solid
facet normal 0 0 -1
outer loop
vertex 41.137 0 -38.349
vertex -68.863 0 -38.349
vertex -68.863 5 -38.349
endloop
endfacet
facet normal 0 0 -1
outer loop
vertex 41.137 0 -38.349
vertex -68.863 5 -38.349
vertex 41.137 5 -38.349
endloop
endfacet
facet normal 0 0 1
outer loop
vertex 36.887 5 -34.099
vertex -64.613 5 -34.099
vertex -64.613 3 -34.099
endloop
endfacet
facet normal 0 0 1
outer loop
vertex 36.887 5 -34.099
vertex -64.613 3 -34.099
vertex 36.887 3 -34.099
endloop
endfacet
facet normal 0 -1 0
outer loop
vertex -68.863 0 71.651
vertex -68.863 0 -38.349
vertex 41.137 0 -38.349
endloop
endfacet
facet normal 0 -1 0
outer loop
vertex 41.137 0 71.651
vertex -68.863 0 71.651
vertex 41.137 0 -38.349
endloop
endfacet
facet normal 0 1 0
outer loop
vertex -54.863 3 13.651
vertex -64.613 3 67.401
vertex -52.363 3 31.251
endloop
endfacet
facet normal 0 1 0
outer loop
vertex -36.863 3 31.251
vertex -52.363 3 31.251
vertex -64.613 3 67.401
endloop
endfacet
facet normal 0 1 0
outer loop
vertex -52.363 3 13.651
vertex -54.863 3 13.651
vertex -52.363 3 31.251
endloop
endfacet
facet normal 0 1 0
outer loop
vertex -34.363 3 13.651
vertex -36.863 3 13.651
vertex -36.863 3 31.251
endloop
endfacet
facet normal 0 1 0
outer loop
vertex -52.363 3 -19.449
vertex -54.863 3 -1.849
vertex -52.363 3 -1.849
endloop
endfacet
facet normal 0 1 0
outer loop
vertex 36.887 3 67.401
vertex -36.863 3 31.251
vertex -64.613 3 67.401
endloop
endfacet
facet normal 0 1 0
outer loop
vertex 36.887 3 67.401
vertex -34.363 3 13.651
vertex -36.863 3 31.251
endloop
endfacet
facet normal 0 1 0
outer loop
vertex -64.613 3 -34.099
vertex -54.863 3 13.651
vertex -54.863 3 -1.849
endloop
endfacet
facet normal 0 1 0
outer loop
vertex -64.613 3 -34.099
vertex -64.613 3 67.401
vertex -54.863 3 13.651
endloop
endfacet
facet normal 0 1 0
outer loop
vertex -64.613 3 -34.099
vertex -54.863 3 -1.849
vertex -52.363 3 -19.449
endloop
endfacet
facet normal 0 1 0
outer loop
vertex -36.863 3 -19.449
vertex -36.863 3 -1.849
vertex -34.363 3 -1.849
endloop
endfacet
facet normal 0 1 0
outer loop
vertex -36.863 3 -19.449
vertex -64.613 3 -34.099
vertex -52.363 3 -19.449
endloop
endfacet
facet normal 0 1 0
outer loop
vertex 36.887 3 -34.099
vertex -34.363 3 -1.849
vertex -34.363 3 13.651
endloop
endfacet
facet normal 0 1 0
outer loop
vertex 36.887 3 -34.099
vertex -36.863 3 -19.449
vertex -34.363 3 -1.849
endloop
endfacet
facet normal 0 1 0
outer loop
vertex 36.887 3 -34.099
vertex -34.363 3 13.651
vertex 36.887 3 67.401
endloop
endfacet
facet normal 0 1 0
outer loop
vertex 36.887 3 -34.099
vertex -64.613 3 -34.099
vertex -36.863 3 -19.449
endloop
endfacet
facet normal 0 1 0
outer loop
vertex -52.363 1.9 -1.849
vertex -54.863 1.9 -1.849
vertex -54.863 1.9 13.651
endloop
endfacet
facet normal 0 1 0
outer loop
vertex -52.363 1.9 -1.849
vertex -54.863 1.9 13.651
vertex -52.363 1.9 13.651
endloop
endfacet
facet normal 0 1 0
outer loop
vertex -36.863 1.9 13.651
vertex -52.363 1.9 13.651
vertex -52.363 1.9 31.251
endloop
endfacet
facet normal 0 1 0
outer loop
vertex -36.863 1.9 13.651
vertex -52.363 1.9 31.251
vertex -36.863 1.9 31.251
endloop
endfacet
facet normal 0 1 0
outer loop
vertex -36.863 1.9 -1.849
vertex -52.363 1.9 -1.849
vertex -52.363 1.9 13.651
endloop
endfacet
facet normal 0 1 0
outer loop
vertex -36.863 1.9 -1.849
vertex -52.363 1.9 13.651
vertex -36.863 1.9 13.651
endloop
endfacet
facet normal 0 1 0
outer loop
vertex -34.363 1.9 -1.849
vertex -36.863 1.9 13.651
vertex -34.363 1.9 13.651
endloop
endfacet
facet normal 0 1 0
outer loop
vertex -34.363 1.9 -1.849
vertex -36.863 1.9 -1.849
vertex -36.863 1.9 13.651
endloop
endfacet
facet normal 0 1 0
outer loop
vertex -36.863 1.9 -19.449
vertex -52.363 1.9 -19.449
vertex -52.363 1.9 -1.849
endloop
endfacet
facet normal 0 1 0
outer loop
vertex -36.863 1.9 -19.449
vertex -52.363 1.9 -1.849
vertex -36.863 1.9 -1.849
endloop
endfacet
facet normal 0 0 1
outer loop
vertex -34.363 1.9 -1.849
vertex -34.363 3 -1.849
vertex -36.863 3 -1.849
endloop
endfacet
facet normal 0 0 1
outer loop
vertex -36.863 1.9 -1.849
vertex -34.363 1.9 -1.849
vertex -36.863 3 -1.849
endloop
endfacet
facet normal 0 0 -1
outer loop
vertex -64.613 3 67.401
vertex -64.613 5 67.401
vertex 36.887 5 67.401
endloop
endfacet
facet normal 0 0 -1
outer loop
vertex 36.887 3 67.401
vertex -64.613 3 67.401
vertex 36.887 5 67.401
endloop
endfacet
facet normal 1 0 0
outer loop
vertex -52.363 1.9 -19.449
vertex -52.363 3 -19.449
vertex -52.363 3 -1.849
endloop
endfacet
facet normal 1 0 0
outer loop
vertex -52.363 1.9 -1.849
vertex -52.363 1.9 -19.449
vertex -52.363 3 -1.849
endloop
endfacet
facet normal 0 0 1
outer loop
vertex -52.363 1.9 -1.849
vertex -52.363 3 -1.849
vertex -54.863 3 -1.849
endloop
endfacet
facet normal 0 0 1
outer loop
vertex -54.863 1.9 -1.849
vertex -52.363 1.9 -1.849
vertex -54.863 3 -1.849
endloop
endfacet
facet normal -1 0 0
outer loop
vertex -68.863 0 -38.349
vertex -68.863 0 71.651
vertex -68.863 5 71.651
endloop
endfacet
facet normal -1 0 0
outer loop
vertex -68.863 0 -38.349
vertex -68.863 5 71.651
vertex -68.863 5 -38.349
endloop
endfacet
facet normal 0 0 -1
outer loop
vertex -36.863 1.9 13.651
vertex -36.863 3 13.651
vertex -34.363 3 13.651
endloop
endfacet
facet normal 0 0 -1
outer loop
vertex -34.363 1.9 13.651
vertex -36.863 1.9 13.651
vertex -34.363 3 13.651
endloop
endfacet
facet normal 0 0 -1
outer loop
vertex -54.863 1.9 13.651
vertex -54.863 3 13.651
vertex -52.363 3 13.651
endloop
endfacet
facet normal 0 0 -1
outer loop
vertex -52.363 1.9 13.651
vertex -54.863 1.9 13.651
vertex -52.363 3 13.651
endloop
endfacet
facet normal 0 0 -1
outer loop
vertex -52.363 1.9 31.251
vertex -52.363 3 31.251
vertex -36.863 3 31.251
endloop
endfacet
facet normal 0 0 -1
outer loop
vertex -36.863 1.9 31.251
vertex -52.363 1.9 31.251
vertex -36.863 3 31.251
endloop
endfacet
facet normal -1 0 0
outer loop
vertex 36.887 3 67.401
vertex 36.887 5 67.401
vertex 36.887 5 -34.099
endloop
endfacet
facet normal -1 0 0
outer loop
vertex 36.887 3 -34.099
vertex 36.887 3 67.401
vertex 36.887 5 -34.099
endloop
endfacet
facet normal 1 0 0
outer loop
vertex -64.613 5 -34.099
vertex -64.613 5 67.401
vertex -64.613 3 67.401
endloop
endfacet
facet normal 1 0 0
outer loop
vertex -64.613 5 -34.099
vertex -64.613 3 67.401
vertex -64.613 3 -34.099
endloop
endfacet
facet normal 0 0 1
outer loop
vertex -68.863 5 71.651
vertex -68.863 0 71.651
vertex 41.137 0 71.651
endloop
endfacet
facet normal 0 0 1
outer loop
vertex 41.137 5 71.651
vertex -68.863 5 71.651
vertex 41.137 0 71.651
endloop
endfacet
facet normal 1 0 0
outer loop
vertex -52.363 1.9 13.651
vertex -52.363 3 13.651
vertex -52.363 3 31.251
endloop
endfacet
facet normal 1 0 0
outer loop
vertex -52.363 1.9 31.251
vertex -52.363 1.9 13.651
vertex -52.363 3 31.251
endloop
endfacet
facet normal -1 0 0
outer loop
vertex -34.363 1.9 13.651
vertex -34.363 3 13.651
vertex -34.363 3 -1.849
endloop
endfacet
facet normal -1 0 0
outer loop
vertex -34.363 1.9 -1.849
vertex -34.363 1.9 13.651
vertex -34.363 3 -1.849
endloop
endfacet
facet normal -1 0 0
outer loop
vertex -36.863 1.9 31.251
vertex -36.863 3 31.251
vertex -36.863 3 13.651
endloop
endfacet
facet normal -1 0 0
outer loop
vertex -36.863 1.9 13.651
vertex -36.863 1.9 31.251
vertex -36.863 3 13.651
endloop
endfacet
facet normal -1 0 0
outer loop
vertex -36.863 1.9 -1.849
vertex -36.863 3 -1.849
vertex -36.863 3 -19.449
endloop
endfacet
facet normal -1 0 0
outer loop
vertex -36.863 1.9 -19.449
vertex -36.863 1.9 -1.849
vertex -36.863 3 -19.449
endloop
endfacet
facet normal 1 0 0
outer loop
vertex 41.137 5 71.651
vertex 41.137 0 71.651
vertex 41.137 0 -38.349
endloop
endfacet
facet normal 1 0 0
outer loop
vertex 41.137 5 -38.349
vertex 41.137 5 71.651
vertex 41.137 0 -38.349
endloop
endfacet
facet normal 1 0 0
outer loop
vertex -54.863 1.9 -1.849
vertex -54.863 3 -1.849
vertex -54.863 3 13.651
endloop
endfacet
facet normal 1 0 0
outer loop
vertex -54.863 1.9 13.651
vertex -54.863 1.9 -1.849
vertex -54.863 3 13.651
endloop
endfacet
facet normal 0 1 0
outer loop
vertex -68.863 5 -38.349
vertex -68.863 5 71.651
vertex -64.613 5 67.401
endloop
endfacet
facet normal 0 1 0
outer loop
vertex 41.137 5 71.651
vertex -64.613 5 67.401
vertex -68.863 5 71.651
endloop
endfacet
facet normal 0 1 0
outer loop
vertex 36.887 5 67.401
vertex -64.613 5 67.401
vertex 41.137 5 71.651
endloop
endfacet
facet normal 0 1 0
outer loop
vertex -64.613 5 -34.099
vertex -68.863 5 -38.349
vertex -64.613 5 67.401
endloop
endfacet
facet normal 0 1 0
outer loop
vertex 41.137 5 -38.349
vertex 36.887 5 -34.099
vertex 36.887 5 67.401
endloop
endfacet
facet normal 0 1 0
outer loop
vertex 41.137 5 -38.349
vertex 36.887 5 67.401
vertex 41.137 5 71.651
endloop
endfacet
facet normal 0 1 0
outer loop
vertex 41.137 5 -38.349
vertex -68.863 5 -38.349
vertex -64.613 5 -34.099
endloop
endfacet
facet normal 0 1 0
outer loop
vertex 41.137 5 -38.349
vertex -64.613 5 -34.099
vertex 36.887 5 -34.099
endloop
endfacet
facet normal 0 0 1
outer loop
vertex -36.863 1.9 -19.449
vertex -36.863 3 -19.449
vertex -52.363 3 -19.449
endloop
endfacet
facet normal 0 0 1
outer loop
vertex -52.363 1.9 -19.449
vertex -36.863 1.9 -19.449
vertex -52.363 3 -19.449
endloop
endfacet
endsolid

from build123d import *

# Parameters (mm, degrees)
SKETCH1_W           = 110
SKETCH1_H           = 110
BOSS_EXTRUDE1_DEPTH = 5
SKETCH2_W           = 101.5
SKETCH2_H           = 101.5
CUT_EXTRUDE1_DEPTH  = 2
CUT_EXTRUDE2_DEPTH  = 1.1


with BuildPart() as part:
    # Sketch1 → Boss-Extrude1 (new body)
    with BuildSketch(Plane(origin=(0, 0, 0), x_dir=(1, 0, 0), z_dir=(0, 1, 0))):
        with Locations((-13.863013699, -16.650684932)):
            Rectangle(SKETCH1_W, SKETCH1_H)
    extrude(amount=BOSS_EXTRUDE1_DEPTH)

    # Sketch2 → Cut-Extrude1 (cut)
    with BuildSketch(Plane(origin=(0, 5, 0), x_dir=(1, 0, 0), z_dir=(0, 1, 0))):
        with Locations((-13.863013699, -16.650684932)):
            Rectangle(SKETCH2_W, SKETCH2_H)
    extrude(amount=-CUT_EXTRUDE1_DEPTH, mode=Mode.SUBTRACT)

    # Sketch3 → Cut-Extrude2 (cut)
    with BuildSketch(Plane(origin=(0, 3, 0), x_dir=(1, 0, 0), z_dir=(0, 1, 0))):
        Polygon((-34.363013699, 1.849315068), (-36.863013699, 1.849315068), (-36.863013699, 19.449315068), (-52.363013699, 19.449315068), (-52.363013699, 1.849315068), (-54.863013699, 1.849315068), (-54.863013699, -13.650684932), (-52.363013699, -13.650684932), (-52.363013699, -31.250684932), (-36.863013699, -31.250684932), (-36.863013699, -13.650684932), (-34.363013699, -13.650684932), align=None)
    extrude(amount=-CUT_EXTRUDE2_DEPTH, mode=Mode.SUBTRACT)


solid = part.part
